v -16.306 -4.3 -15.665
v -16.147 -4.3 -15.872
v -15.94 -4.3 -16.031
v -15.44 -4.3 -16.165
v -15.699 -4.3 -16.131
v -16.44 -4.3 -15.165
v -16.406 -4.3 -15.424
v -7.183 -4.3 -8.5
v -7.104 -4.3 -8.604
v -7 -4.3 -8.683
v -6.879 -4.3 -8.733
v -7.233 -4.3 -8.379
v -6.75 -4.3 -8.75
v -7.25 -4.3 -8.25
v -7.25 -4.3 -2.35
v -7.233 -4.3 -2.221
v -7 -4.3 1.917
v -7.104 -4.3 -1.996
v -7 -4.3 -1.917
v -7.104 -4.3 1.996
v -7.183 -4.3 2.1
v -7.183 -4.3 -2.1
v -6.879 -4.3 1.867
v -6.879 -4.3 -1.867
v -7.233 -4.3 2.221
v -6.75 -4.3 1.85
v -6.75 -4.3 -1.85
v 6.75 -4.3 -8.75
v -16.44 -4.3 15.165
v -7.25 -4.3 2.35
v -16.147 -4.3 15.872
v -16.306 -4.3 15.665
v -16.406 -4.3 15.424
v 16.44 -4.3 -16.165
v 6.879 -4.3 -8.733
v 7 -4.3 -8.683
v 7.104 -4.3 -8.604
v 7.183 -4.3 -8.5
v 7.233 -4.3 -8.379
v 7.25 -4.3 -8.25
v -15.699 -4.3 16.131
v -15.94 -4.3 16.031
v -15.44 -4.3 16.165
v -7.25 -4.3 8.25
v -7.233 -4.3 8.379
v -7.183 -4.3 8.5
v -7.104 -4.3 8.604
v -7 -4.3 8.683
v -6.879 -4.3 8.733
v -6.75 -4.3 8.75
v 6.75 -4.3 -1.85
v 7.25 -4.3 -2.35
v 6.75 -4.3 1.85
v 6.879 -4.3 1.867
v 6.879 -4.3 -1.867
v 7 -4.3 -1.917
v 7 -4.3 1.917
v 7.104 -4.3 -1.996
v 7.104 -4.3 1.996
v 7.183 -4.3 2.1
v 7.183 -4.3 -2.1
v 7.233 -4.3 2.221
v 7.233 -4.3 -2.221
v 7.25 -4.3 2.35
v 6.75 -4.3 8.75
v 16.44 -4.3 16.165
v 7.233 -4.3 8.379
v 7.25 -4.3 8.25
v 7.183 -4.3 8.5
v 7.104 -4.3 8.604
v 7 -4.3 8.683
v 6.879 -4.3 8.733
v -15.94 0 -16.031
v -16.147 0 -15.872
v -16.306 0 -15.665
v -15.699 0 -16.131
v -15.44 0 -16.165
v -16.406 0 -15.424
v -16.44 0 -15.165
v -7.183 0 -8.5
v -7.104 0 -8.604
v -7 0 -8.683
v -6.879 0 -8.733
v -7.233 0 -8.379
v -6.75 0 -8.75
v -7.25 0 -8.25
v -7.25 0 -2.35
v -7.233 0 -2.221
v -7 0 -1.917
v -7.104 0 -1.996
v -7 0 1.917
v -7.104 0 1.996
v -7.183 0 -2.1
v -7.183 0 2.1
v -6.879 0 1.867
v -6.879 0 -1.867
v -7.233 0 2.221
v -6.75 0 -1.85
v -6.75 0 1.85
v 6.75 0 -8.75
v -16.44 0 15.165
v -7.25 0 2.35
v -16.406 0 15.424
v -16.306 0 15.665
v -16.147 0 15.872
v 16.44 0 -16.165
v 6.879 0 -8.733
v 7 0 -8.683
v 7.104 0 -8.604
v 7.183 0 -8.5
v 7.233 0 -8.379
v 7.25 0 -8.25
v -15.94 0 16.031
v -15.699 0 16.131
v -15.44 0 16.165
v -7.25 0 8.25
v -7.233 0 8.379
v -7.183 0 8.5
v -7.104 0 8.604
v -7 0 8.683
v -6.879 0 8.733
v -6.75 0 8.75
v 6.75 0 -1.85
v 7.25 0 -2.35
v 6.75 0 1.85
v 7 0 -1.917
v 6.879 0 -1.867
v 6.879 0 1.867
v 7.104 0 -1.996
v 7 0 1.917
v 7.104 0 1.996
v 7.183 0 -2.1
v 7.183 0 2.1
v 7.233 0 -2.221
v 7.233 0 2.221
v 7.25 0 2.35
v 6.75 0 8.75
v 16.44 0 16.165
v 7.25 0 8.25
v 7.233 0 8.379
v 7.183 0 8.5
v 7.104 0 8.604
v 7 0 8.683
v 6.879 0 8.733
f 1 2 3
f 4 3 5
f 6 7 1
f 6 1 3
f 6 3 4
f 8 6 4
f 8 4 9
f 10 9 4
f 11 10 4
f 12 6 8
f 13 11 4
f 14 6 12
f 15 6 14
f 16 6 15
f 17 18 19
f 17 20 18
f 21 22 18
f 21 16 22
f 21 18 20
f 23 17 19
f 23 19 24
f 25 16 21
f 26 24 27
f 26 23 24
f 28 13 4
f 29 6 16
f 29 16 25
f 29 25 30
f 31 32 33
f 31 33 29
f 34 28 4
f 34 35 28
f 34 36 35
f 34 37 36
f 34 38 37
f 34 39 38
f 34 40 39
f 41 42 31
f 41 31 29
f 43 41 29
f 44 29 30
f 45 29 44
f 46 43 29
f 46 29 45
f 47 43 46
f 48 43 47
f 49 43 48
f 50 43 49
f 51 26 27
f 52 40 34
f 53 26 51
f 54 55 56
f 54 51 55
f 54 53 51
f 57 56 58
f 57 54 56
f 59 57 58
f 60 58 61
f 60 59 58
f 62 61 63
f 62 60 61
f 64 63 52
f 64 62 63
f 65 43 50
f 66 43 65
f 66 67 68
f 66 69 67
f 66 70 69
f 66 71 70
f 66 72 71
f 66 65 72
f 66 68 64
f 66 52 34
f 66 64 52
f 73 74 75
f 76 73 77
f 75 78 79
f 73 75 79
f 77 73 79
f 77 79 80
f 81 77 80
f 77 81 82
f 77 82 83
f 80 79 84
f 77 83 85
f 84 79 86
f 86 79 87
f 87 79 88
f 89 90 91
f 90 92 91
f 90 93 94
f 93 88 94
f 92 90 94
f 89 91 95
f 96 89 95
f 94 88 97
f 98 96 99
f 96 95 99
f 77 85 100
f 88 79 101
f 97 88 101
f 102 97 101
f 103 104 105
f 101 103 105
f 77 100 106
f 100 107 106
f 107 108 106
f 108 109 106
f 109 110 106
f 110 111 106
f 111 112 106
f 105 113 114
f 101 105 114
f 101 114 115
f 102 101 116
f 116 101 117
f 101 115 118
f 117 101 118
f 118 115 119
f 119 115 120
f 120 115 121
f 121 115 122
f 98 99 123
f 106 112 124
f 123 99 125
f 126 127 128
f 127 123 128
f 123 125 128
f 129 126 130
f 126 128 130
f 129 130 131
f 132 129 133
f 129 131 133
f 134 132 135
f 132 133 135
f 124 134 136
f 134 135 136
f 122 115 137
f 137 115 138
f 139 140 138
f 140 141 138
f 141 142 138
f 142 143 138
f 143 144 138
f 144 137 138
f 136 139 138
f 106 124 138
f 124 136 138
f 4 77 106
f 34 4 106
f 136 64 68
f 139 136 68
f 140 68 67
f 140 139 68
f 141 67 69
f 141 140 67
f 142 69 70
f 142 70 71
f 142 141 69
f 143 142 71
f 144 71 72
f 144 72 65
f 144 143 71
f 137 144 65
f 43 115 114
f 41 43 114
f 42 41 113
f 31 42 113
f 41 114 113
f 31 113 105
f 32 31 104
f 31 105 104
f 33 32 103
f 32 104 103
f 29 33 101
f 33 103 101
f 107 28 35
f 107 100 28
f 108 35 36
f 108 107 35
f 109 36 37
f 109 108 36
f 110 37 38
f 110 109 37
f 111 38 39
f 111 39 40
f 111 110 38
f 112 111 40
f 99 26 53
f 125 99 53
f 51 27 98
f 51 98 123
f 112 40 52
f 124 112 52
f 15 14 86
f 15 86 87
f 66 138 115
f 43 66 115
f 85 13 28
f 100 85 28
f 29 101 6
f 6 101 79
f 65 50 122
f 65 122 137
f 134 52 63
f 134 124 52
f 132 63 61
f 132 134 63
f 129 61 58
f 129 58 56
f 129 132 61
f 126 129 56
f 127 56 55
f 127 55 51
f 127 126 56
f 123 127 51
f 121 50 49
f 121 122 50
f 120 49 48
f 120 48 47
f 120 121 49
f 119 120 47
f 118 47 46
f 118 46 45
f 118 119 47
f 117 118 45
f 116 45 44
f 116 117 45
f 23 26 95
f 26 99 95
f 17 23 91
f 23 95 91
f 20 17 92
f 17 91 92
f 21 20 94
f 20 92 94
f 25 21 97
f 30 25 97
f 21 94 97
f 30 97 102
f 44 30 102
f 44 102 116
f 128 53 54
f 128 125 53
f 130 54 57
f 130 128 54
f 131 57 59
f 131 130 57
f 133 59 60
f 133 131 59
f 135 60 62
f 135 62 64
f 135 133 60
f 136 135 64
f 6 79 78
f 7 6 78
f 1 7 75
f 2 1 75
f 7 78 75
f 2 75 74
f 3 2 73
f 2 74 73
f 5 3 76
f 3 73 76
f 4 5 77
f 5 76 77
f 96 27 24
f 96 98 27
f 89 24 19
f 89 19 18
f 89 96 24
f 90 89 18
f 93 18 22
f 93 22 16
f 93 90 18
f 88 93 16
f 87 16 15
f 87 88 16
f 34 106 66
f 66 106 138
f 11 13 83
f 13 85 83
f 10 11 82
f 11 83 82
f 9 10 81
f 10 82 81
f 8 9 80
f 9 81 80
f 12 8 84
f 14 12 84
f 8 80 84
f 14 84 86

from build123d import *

# Parameters (mm, degrees)
F1_DEPTH = 4.3
F2_W     = 14.5
F2_H     = 6.9
F3_DEPTH = 25
F4_R     = 0.5


with BuildPart() as f1:
    # F0 (on Front) → F1 (new body)
    with BuildSketch(Plane.XZ):
        with BuildLine():
            Line((16.44, -16.165), (16.44, 16.165))
            Line((16.44, 16.165), (-15.44, 16.165))
            ThreePointArc((-15.44, 16.165), (-16.147107, 15.872107), (-16.44, 15.165))
            Line((-16.44, 15.165), (-16.44, -15.165))
            ThreePointArc((-16.44, -15.165), (-16.147107, -15.872107), (-15.44, -16.165))
            Line((-15.44, -16.165), (16.44, -16.165))
        make_face()
    extrude(amount=F1_DEPTH)

    # F2 (on face) → F3 (cut)
    with BuildSketch(Plane.XZ.offset(4.3)):
        with Locations((0, 5.3)):
            Rectangle(F2_W, F2_H)
        with Locations((0, -5.3)):
            Rectangle(F2_W, F2_H)
    extrude(amount=-F3_DEPTH, mode=Mode.SUBTRACT)

    # F4
    f4_edges = [f1.edges().sort_by_distance(p)[0] for p in [
        (7.25, -2.15, 8.75),
        (7.25, -2.15, 1.85),
        (-7.25, -2.15, 1.85),
        (-7.25, -2.15, 8.75),
        (-7.25, -2.15, -1.85),
        (7.25, -2.15, -1.85),
        (7.25, -2.15, -8.75),
        (-7.25, -2.15, -8.75),
    ]]
    fillet(f4_edges, radius=F4_R)


solid = f1.part
